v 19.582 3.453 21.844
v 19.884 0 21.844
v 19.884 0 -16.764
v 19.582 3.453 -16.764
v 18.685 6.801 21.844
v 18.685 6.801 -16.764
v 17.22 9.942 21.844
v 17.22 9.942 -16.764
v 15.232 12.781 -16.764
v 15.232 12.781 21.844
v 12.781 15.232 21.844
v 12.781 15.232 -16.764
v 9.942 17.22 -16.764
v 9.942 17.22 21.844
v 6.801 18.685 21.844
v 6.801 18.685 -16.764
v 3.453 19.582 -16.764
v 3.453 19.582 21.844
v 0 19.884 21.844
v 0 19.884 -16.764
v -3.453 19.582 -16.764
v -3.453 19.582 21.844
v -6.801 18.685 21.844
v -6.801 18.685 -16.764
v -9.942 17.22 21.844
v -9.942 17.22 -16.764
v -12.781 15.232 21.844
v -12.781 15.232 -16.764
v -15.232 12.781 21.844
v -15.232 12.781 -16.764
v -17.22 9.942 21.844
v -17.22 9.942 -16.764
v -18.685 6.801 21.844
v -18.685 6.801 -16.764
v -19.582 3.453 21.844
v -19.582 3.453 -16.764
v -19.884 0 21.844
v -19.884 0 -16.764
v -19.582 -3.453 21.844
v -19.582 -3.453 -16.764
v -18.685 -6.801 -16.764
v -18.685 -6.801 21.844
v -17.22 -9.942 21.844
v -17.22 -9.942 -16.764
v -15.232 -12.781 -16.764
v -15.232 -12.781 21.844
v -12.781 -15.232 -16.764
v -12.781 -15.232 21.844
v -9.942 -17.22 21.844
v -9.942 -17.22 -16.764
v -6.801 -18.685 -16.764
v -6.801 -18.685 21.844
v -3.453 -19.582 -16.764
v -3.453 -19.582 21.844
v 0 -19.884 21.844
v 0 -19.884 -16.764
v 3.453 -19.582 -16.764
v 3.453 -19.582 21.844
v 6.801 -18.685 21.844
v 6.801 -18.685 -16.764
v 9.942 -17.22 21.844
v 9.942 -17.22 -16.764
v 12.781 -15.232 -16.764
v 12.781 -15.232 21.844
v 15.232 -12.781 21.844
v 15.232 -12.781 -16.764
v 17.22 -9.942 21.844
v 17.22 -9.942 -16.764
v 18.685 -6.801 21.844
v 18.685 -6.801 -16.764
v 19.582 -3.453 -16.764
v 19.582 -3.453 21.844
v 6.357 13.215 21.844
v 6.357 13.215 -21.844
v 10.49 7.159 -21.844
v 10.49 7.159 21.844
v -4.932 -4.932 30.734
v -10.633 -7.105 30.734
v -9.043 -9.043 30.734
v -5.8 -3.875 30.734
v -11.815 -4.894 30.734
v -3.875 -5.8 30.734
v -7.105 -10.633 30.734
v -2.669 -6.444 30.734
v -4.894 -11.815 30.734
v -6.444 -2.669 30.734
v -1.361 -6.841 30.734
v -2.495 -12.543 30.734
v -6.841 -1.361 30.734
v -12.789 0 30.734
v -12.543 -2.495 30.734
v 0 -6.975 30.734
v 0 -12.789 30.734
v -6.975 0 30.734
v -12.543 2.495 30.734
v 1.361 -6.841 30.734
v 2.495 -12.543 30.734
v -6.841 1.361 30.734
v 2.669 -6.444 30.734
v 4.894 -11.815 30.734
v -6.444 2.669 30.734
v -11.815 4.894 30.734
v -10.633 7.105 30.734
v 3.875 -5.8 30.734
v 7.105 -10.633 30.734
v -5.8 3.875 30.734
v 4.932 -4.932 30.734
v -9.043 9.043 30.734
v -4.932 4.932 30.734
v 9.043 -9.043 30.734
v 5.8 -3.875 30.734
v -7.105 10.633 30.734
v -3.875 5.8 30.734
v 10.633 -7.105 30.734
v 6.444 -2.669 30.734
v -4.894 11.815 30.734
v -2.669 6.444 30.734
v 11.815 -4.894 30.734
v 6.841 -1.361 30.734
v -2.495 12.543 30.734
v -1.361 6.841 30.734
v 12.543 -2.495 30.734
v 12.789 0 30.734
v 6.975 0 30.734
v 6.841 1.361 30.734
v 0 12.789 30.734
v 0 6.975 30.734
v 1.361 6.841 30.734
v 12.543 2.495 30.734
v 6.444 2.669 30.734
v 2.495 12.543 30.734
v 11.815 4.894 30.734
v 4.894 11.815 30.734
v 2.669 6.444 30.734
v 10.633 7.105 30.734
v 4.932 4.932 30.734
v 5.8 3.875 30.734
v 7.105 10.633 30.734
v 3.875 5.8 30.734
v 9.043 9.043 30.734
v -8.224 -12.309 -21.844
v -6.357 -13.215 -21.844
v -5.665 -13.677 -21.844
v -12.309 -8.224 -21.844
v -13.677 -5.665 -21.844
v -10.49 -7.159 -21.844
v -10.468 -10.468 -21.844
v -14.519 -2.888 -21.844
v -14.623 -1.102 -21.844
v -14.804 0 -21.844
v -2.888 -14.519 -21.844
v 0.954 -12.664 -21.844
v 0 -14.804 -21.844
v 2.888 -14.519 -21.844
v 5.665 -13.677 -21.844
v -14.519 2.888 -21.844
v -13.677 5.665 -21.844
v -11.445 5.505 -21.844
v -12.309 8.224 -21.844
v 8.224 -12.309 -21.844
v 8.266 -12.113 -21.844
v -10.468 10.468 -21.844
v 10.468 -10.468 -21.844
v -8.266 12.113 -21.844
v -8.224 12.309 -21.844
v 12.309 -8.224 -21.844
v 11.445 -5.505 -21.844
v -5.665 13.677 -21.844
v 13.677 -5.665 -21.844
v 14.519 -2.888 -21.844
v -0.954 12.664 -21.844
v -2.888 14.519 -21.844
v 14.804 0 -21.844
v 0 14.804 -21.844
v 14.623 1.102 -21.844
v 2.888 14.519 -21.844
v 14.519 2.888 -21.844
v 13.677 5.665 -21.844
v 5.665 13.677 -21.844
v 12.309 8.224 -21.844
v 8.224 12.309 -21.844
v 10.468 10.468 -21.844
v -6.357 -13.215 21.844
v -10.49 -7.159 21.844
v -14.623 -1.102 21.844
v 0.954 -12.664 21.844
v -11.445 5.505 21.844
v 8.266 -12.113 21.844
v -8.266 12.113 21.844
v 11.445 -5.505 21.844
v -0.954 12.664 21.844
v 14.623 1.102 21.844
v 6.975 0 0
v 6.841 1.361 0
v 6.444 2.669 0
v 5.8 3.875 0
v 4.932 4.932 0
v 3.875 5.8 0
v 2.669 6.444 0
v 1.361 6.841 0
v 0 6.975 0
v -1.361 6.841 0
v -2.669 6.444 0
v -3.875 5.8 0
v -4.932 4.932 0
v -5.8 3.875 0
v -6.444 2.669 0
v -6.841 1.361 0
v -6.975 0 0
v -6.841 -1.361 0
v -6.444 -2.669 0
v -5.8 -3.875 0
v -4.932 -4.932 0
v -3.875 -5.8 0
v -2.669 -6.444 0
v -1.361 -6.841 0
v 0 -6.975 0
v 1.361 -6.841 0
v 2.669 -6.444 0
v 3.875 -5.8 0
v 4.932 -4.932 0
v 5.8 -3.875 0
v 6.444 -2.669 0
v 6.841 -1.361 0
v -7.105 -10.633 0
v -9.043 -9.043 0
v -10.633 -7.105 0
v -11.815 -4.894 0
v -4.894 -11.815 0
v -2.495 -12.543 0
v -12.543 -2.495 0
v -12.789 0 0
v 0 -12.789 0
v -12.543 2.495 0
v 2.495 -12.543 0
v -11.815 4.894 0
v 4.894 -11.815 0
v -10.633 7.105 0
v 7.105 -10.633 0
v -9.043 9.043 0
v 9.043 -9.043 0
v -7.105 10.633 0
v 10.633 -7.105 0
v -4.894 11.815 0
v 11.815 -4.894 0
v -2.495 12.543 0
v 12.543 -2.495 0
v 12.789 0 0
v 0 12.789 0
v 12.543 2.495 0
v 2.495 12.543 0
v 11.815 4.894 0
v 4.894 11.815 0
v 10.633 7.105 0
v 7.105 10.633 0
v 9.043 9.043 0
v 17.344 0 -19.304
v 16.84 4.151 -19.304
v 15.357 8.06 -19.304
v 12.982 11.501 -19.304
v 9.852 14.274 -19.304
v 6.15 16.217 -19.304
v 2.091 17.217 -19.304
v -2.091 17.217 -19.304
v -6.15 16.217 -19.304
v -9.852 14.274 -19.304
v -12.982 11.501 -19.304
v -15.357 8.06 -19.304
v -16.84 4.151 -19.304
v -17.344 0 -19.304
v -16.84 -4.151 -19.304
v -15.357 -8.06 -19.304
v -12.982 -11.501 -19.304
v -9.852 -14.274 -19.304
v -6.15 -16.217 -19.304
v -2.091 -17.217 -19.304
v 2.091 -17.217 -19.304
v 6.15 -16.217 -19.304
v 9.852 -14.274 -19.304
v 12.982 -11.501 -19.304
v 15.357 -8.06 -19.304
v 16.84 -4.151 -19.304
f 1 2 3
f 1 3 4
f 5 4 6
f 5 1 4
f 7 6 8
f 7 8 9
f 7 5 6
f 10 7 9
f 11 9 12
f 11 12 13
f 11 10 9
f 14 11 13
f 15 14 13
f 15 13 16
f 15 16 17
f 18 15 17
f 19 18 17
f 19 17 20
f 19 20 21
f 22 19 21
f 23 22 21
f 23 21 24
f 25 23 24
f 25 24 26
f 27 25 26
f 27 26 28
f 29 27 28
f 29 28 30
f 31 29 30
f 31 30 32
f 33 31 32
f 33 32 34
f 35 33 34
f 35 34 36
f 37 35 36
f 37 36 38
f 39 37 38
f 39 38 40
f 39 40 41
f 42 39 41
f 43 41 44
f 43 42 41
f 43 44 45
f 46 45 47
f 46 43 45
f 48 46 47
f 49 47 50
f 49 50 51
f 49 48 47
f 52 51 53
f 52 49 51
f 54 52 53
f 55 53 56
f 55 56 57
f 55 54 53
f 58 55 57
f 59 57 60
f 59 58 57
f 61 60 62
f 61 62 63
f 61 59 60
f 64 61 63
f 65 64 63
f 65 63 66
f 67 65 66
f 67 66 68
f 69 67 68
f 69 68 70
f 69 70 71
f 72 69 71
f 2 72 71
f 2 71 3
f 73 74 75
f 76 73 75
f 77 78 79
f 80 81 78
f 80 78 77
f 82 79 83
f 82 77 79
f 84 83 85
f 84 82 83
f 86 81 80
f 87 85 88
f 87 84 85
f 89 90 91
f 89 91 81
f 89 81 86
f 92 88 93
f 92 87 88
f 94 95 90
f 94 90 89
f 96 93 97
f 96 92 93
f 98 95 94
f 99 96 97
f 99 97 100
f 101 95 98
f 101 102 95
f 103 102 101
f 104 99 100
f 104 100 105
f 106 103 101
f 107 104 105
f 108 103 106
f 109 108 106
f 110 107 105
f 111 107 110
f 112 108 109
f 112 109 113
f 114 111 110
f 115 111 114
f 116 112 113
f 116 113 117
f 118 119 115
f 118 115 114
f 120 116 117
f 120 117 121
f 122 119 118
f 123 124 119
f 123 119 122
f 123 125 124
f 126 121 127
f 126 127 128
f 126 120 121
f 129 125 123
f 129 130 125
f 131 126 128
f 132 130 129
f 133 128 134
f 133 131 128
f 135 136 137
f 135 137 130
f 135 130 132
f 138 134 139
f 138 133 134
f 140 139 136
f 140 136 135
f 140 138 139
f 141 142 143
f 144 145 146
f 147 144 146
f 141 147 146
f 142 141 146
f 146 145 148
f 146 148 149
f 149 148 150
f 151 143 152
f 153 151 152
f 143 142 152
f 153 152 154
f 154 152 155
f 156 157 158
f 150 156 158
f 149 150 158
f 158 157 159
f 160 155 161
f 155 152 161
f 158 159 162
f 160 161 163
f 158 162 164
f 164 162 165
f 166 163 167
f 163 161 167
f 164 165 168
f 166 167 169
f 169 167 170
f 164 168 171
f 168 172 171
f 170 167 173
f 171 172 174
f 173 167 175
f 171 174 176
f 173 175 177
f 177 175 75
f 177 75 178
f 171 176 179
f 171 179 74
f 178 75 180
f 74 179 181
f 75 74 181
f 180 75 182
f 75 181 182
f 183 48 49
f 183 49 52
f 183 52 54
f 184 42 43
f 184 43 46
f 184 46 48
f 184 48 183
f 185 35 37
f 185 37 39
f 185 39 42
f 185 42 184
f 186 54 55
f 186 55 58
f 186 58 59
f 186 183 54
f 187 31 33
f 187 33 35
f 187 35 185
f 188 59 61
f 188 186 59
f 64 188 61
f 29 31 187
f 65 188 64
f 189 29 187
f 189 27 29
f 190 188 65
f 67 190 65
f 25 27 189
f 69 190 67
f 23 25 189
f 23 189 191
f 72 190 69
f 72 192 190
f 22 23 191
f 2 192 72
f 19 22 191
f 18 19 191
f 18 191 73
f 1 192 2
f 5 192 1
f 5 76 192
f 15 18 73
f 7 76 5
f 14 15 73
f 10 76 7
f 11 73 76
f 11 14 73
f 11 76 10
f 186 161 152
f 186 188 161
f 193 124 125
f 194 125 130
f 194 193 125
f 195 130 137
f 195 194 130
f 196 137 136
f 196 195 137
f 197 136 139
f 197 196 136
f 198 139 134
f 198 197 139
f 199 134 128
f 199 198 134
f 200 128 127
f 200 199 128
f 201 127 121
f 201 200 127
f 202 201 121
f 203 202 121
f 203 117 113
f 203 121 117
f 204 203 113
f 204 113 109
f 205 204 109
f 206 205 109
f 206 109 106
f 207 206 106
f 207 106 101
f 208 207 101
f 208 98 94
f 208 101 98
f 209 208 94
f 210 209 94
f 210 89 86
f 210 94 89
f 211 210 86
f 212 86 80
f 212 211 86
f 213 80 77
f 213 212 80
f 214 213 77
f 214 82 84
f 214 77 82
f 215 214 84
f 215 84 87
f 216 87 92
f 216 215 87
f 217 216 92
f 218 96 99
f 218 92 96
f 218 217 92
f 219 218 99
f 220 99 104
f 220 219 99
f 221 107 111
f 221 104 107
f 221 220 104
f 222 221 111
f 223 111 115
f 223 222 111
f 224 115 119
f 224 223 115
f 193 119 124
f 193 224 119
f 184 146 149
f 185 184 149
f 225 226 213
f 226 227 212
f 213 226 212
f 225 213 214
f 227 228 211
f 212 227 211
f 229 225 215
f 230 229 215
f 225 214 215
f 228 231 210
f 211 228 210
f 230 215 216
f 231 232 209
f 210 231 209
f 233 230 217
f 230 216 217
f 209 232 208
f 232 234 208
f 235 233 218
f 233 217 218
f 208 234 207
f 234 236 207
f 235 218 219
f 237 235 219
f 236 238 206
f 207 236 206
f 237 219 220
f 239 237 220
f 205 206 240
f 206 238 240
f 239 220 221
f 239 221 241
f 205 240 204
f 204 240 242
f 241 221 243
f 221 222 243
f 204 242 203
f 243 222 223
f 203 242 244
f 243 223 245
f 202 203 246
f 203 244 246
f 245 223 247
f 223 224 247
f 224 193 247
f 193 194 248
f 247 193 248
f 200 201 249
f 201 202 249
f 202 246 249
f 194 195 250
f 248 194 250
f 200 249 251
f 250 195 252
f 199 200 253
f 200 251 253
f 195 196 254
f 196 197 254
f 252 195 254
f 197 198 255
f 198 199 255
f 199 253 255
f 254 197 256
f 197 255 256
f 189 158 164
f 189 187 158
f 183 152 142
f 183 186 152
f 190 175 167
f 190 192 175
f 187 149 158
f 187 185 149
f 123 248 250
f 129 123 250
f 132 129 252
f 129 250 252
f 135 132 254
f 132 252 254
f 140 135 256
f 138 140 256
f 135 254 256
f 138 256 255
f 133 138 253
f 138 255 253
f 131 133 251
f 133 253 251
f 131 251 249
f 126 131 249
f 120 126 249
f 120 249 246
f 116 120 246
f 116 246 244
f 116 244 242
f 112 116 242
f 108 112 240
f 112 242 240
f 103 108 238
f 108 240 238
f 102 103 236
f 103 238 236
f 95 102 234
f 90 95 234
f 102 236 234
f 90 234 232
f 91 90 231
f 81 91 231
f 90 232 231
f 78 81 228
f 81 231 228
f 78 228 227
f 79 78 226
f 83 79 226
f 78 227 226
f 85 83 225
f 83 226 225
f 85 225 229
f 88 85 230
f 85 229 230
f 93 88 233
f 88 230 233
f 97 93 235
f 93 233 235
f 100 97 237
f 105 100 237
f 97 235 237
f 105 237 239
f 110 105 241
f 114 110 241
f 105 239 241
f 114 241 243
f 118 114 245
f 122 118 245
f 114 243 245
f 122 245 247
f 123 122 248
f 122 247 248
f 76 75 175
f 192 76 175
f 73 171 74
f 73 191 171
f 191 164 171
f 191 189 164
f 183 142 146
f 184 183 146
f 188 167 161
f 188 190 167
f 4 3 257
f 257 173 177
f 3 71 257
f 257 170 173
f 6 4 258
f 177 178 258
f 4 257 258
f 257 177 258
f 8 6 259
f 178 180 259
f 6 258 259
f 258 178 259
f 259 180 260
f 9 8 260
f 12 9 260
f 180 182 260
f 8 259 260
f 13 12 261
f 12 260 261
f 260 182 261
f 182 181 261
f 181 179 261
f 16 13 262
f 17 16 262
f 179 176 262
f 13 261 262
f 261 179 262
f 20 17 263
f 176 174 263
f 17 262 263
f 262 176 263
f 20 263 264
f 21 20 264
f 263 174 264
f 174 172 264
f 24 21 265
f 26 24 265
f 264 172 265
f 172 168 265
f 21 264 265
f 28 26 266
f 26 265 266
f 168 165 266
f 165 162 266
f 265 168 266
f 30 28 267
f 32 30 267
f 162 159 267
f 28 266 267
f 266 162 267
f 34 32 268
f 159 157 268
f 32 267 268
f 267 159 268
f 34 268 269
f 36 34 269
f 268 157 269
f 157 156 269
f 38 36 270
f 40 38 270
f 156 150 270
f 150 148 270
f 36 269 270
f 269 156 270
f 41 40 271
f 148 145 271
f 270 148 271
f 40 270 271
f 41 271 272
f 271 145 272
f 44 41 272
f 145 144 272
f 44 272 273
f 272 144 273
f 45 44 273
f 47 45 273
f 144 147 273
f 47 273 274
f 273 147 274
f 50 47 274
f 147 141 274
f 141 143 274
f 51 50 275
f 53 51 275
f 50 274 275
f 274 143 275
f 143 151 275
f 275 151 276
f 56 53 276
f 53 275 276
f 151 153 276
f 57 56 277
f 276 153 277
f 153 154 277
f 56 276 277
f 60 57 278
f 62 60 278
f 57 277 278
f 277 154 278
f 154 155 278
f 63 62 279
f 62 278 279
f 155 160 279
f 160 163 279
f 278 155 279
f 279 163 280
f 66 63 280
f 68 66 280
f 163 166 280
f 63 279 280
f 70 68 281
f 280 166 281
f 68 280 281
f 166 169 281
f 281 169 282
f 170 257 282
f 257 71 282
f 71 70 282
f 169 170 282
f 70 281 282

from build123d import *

# Parameters (mm, degrees)
F0_R     = 19.883694
F1_DEPTH = 21.844
F2_SIZE  = 5.08
F4_R     = 12.788511
F5_DEPTH = 30.734
F3_R     = 6.975126
F6_DEPTH = 48.768


with BuildPart() as f1:
    # F0 (on Top) → F1 (new body, symmetric)
    with BuildSketch(Plane.XY):
        Circle(F0_R)
        Polygon((6.357119, 13.215157), (10.49017, 7.158654), (14.623221, 1.102152), (11.444662, -5.505427), (8.266102, -12.113005), (0.954491, -12.664081), (-6.357119, -13.215157), (-10.49017, -7.158654), (-14.623221, -1.102152), (-11.444662, 5.505427), (-8.266102, 12.113005), (-0.954491, 12.664081), align=None, mode=Mode.SUBTRACT)
    extrude(amount=F1_DEPTH, both=True)

    # F2
    f2_edges = [f1.edges().sort_by_distance(p)[0] for p in [
        (-19.883694, 0, -21.844),
    ]]
    chamfer(f2_edges, length=F2_SIZE)


with BuildPart() as f5:
    # F4 (on face) → F5 (new body)
    with BuildSketch(Plane.XY):
        Circle(F4_R)
    extrude(amount=F5_DEPTH)

    # F3 (on face) → F6 (cut)
    with BuildSketch(Plane.XY):
        Circle(F3_R)
    extrude(amount=F6_DEPTH, mode=Mode.SUBTRACT)


solid = Compound([f1.part, f5.part])
